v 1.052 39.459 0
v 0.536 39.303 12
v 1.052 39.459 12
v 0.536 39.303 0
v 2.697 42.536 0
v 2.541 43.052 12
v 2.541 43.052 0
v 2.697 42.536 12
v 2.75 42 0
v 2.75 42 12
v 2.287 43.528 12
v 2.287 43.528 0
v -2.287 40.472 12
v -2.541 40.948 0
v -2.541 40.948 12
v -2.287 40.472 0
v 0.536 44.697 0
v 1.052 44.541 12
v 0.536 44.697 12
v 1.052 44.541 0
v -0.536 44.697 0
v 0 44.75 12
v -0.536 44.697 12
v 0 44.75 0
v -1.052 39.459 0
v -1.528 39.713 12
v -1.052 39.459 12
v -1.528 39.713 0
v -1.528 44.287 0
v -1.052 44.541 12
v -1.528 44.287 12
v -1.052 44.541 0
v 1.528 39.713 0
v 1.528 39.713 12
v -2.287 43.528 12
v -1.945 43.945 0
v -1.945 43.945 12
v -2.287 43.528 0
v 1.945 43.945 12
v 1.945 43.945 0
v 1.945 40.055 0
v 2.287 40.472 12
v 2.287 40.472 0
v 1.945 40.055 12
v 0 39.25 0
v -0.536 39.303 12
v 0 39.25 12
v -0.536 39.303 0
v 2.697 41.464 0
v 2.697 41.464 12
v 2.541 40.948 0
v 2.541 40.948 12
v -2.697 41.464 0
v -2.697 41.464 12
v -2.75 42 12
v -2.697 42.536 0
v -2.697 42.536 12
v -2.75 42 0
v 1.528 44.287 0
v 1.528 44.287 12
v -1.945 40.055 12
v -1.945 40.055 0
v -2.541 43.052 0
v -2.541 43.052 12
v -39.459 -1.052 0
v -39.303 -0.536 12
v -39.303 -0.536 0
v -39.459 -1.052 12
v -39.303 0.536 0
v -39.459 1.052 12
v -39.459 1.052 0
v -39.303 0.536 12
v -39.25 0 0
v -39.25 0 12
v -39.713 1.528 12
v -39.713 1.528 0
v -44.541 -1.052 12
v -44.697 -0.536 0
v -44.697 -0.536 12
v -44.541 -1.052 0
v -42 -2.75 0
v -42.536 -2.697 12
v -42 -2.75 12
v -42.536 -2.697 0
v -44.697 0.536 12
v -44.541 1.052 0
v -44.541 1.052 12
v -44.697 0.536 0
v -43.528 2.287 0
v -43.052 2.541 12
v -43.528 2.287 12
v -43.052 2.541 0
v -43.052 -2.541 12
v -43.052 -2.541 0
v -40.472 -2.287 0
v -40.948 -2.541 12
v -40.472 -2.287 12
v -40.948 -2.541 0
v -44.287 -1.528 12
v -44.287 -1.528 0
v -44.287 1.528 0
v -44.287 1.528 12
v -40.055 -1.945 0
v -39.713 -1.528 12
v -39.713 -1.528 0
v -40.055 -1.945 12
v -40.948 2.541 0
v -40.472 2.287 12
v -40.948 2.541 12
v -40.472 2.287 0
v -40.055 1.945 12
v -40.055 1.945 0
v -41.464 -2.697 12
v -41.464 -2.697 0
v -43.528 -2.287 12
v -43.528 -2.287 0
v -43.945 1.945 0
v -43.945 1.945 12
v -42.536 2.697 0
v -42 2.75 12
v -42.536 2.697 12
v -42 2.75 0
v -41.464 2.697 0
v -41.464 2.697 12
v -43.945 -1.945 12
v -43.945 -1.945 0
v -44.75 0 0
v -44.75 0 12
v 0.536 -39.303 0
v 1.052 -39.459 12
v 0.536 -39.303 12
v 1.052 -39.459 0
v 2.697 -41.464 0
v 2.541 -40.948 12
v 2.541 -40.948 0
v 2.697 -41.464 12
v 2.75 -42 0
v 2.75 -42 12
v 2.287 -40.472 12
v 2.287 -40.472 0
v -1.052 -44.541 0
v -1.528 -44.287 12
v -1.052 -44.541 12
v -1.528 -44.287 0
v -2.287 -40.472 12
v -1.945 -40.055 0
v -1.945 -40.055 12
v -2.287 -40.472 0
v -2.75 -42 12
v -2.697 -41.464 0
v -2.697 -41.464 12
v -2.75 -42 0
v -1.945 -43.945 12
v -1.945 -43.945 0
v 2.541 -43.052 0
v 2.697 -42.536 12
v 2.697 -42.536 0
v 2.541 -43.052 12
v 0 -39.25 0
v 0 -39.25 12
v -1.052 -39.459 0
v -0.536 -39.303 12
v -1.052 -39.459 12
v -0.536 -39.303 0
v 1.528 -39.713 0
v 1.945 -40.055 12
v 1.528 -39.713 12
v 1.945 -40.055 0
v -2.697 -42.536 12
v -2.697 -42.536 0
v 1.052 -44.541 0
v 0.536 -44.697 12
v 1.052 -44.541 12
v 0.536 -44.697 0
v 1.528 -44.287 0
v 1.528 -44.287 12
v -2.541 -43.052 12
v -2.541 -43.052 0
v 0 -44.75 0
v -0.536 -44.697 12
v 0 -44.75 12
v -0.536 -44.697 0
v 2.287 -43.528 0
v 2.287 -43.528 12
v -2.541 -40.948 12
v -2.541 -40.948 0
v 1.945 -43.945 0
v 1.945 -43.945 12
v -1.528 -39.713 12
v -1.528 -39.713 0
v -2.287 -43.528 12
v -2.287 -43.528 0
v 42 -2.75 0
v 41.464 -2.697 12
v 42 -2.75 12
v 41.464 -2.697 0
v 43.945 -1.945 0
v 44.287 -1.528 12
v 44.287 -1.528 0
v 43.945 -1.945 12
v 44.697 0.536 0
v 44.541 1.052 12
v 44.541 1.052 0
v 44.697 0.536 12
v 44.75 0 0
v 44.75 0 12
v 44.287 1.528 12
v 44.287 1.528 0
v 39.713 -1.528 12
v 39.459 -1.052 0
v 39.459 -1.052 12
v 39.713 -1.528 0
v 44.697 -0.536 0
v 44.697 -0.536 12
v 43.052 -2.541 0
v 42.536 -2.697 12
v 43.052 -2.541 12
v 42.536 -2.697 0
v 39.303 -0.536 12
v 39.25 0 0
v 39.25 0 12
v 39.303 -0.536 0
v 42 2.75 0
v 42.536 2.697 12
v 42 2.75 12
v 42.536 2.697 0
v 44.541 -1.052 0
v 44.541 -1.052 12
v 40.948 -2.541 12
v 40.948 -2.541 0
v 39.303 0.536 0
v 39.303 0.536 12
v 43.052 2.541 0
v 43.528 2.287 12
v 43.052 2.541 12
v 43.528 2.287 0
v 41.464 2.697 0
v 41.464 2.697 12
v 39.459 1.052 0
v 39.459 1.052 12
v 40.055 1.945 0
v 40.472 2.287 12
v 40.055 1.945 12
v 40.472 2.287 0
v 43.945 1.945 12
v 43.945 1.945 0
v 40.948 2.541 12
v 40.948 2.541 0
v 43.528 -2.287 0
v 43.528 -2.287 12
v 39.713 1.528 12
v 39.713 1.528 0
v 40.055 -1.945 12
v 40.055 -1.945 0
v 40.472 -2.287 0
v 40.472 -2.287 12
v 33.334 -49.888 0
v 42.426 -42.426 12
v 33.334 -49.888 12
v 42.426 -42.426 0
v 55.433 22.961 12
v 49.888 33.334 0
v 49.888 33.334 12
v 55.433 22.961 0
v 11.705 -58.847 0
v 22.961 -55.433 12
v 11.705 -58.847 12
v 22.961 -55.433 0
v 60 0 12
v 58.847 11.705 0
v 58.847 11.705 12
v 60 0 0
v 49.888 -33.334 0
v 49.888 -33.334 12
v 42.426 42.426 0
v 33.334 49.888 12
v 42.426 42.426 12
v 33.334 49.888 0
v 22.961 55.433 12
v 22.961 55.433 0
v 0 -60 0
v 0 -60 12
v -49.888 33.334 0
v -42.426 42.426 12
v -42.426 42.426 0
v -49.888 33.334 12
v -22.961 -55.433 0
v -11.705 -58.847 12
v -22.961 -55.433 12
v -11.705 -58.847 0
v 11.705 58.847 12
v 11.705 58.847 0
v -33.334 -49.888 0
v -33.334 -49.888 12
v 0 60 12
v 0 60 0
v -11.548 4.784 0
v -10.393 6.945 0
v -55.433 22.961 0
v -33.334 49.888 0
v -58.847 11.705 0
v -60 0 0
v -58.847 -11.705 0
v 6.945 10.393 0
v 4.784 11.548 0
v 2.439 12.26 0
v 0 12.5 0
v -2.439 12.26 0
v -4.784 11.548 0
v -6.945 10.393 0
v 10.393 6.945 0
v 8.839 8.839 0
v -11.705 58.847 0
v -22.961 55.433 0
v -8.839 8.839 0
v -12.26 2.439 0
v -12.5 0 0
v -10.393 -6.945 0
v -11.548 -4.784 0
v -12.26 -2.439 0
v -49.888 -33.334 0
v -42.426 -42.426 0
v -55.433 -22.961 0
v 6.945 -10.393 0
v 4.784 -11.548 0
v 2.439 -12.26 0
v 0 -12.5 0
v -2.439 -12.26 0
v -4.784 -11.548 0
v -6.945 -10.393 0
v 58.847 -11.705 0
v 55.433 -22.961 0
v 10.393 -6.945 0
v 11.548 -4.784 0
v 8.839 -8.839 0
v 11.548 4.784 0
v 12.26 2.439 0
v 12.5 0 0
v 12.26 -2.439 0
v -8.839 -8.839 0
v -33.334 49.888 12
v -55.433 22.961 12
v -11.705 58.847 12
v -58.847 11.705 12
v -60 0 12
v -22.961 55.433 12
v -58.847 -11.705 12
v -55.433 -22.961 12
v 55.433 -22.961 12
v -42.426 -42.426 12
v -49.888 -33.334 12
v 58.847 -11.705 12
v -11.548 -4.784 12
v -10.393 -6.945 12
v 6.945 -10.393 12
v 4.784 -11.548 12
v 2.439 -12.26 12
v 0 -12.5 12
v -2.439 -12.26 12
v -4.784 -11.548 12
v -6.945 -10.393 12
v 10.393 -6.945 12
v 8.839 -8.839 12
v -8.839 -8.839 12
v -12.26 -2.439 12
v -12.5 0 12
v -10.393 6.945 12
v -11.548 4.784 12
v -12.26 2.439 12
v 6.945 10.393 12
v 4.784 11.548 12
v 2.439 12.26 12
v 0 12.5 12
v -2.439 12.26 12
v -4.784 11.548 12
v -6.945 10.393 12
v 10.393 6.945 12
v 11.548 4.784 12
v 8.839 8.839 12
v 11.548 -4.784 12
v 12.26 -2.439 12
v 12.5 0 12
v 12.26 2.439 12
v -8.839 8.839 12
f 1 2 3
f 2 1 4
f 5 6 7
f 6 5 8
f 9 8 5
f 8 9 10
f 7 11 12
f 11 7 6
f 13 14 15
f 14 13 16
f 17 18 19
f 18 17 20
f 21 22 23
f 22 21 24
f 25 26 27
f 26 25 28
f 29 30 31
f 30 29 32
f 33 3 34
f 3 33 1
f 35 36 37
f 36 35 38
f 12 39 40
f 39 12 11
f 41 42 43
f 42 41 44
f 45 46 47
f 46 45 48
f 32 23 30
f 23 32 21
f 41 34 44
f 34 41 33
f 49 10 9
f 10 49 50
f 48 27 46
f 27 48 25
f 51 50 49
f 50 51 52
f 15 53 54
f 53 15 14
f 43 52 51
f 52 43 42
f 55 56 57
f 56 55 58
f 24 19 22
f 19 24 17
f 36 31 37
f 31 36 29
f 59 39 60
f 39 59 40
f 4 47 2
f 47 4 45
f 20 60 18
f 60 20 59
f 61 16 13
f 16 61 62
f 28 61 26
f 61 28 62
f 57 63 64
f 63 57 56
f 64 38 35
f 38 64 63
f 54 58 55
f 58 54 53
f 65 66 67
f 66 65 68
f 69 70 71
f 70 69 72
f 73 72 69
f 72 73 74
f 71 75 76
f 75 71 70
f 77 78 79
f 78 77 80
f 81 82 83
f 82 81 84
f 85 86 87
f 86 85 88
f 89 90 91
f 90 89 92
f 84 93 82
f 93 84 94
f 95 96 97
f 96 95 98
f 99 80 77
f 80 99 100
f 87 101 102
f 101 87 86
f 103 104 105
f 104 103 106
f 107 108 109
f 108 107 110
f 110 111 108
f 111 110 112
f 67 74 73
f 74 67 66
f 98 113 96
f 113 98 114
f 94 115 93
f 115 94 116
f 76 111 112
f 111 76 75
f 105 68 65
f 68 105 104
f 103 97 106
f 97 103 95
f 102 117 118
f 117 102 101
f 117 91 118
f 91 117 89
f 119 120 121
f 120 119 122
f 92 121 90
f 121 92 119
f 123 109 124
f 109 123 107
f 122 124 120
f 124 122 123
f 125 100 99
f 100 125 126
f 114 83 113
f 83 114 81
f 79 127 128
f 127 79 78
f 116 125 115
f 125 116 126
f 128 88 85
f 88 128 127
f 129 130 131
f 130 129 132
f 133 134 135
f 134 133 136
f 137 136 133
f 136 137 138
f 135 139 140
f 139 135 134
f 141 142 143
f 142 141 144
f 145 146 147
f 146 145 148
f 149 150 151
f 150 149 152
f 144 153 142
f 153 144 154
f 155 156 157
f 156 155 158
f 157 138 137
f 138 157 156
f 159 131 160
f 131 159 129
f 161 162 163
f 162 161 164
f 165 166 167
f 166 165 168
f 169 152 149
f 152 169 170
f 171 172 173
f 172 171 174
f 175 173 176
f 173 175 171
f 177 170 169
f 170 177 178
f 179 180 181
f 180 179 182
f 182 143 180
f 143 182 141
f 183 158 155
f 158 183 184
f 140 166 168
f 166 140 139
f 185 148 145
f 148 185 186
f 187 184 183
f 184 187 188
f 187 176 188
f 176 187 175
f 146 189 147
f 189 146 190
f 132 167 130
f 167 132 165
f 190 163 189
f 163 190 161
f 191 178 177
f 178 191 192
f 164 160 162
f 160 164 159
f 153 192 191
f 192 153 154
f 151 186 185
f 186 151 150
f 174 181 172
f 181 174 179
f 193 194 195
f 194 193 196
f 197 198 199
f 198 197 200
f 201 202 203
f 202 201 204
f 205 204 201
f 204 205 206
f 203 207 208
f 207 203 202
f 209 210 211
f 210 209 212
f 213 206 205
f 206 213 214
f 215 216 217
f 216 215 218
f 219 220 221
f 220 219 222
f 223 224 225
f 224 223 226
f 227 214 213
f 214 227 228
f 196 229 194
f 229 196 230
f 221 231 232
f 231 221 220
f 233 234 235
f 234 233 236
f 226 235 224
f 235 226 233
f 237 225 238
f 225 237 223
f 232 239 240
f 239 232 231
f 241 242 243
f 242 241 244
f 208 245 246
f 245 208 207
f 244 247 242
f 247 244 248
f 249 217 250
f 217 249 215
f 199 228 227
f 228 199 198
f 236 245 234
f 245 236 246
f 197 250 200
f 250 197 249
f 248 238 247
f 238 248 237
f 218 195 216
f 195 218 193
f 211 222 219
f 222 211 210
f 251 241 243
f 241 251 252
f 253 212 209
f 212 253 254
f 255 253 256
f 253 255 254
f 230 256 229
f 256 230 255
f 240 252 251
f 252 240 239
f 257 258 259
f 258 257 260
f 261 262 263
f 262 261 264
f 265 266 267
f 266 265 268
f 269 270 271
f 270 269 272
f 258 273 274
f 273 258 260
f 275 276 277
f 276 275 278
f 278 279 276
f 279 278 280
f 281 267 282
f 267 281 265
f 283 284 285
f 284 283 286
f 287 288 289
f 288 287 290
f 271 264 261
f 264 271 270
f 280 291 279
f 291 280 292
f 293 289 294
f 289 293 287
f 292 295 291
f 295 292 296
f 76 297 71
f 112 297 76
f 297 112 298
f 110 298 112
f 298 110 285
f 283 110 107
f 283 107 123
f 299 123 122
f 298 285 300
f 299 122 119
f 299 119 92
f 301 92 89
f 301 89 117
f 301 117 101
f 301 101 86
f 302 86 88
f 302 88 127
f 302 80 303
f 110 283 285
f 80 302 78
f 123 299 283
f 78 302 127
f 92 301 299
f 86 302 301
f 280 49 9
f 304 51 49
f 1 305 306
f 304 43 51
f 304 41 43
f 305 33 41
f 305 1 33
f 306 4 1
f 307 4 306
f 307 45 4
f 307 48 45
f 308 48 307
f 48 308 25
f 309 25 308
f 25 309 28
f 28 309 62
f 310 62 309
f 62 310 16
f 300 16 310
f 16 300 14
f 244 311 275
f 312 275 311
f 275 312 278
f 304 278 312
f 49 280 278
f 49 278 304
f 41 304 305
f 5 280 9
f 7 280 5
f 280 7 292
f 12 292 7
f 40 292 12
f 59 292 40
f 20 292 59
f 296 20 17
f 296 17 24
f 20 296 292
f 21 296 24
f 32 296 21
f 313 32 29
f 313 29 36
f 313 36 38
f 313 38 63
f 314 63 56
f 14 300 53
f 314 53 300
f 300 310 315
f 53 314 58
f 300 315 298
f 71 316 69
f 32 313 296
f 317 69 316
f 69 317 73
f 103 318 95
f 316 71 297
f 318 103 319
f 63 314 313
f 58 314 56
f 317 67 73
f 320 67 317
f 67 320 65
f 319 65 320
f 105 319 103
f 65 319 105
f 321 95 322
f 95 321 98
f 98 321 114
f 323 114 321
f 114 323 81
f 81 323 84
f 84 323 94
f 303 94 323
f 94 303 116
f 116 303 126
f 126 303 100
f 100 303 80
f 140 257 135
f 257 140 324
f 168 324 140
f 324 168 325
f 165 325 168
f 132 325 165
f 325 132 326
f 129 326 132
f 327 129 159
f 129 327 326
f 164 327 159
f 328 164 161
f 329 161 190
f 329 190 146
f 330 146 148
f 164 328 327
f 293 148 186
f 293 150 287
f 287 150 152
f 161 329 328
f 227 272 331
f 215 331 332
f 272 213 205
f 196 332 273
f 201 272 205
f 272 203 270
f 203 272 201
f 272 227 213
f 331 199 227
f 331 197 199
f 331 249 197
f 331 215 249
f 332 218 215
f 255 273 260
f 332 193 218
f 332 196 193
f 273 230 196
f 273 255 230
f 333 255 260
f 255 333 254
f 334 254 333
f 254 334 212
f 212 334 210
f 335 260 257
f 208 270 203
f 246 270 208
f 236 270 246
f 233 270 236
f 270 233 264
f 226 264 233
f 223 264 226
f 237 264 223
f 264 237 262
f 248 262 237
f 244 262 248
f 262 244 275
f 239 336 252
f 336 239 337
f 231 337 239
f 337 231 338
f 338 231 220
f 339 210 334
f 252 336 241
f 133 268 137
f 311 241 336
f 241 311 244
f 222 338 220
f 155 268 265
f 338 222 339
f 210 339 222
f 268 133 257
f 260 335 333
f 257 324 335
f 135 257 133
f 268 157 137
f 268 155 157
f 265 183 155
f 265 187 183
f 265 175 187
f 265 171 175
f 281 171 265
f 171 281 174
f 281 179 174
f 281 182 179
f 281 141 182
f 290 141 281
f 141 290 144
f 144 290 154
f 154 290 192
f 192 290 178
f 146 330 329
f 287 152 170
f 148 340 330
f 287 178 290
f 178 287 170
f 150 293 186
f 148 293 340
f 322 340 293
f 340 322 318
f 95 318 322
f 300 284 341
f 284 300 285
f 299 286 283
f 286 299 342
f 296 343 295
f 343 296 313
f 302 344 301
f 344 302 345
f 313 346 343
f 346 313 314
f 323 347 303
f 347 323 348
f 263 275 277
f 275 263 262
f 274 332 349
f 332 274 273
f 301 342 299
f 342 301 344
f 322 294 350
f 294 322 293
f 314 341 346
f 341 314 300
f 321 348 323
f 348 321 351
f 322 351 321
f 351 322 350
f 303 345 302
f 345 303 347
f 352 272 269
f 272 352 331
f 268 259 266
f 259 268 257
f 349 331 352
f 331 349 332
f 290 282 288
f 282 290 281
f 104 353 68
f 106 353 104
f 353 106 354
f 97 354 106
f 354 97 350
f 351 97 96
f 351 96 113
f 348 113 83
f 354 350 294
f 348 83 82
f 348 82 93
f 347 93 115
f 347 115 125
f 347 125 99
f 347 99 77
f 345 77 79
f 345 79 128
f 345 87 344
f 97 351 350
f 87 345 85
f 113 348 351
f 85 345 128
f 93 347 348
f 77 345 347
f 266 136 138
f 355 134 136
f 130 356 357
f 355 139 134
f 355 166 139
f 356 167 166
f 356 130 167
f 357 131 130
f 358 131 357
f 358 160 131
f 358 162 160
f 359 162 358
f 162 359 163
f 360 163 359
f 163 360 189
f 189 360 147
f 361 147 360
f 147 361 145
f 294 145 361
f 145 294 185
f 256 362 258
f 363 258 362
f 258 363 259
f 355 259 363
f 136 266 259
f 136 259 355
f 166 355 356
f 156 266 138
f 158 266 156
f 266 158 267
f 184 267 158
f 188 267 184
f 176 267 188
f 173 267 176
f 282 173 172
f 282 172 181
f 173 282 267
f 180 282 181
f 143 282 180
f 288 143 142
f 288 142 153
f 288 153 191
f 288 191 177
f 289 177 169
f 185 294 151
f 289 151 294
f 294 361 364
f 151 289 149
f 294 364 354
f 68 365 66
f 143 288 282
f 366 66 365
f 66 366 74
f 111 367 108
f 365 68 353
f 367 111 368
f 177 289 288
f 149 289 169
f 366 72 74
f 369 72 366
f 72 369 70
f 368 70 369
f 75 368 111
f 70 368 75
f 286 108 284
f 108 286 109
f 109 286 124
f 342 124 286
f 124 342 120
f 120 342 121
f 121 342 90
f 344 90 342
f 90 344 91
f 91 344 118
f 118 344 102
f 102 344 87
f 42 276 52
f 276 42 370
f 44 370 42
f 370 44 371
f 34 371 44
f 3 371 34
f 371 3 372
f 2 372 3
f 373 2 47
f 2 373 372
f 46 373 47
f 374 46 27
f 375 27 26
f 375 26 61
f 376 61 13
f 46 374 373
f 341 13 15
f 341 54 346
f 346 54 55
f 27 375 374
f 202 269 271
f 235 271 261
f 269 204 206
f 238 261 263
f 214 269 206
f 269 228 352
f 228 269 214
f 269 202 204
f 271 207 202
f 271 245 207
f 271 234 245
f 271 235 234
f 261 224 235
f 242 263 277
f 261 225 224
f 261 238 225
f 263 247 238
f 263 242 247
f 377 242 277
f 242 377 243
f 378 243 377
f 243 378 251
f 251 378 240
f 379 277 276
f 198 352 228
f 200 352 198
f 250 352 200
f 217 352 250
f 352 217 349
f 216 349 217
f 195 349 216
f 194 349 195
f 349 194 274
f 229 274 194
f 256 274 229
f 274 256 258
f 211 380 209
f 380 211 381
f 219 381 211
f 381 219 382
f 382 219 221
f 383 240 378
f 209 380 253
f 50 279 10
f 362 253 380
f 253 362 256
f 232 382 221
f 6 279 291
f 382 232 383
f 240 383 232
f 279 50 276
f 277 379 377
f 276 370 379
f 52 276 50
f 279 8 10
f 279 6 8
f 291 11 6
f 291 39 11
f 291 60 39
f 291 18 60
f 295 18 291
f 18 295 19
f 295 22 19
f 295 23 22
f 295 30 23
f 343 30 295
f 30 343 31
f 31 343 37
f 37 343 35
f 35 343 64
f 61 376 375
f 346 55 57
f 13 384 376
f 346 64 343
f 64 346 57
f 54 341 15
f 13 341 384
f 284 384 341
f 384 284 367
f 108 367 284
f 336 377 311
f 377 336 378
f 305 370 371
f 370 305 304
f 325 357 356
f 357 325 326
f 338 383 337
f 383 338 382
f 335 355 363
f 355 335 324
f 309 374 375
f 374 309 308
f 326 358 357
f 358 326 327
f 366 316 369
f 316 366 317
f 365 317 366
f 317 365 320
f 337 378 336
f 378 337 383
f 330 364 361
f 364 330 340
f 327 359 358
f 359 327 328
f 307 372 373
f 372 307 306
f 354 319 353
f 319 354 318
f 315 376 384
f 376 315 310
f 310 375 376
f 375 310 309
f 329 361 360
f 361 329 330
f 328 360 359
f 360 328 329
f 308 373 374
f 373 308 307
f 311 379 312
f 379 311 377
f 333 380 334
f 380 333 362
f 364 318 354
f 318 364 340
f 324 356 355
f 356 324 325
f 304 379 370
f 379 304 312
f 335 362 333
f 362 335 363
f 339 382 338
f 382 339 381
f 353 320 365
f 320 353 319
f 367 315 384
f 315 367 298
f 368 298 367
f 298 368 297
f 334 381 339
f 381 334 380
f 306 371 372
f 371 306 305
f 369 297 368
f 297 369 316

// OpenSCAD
$fn = 32;

// ----------------------------------------------------------------------
// Flange Ø120 x 12
// 4 holes on a Ø84 bolt circle, bolted joints
// ----------------------------------------------------------------------

// --- parameters (mm) ---
flange_d = 120;  // outside diameter of the flange
thickness = 12;  // flange thickness
holes = 4;       // number of bolt holes
pcd = 84;        // bolt circle diameter
start_deg = 90;  // angle of the first hole, from +X
hole_d = 5.5;    // bolt hole diameter
bore_d = 25;     // central through bore
hub_d = 35;      // hub outside diameter
hub_h = 0;       // hub height above the flange face (0 = no hub)

// --- derived feature positions (mm) ---
height = thickness + hub_h;  // = 12   overall height of the part
pcd_r = pcd / 2;             // = 42   bolt circle radius
hole_step = 360 / holes;     // = 90   angular pitch
feature_centers = [
  [pcd_r * cos(start_deg + 0 * hole_step), pcd_r * sin(start_deg + 0 * hole_step)],
  [pcd_r * cos(start_deg + 1 * hole_step), pcd_r * sin(start_deg + 1 * hole_step)],
  [pcd_r * cos(start_deg + 2 * hole_step), pcd_r * sin(start_deg + 2 * hole_step)],
  [pcd_r * cos(start_deg + 3 * hole_step), pcd_r * sin(start_deg + 3 * hole_step)]
];   // bolt hole centres on the pitch circle

// flange disc, every hole and the bore cut straight through
difference() {
  union() {
    cylinder(d = flange_d, h = thickness);
  }
  translate([0, 0, -1]) cylinder(d = bore_d, h = height + 2);  // bore, through
  for (centre = feature_centers)
    translate([centre[0], centre[1], -1]) cylinder(d = hole_d, h = thickness + 2);
}
